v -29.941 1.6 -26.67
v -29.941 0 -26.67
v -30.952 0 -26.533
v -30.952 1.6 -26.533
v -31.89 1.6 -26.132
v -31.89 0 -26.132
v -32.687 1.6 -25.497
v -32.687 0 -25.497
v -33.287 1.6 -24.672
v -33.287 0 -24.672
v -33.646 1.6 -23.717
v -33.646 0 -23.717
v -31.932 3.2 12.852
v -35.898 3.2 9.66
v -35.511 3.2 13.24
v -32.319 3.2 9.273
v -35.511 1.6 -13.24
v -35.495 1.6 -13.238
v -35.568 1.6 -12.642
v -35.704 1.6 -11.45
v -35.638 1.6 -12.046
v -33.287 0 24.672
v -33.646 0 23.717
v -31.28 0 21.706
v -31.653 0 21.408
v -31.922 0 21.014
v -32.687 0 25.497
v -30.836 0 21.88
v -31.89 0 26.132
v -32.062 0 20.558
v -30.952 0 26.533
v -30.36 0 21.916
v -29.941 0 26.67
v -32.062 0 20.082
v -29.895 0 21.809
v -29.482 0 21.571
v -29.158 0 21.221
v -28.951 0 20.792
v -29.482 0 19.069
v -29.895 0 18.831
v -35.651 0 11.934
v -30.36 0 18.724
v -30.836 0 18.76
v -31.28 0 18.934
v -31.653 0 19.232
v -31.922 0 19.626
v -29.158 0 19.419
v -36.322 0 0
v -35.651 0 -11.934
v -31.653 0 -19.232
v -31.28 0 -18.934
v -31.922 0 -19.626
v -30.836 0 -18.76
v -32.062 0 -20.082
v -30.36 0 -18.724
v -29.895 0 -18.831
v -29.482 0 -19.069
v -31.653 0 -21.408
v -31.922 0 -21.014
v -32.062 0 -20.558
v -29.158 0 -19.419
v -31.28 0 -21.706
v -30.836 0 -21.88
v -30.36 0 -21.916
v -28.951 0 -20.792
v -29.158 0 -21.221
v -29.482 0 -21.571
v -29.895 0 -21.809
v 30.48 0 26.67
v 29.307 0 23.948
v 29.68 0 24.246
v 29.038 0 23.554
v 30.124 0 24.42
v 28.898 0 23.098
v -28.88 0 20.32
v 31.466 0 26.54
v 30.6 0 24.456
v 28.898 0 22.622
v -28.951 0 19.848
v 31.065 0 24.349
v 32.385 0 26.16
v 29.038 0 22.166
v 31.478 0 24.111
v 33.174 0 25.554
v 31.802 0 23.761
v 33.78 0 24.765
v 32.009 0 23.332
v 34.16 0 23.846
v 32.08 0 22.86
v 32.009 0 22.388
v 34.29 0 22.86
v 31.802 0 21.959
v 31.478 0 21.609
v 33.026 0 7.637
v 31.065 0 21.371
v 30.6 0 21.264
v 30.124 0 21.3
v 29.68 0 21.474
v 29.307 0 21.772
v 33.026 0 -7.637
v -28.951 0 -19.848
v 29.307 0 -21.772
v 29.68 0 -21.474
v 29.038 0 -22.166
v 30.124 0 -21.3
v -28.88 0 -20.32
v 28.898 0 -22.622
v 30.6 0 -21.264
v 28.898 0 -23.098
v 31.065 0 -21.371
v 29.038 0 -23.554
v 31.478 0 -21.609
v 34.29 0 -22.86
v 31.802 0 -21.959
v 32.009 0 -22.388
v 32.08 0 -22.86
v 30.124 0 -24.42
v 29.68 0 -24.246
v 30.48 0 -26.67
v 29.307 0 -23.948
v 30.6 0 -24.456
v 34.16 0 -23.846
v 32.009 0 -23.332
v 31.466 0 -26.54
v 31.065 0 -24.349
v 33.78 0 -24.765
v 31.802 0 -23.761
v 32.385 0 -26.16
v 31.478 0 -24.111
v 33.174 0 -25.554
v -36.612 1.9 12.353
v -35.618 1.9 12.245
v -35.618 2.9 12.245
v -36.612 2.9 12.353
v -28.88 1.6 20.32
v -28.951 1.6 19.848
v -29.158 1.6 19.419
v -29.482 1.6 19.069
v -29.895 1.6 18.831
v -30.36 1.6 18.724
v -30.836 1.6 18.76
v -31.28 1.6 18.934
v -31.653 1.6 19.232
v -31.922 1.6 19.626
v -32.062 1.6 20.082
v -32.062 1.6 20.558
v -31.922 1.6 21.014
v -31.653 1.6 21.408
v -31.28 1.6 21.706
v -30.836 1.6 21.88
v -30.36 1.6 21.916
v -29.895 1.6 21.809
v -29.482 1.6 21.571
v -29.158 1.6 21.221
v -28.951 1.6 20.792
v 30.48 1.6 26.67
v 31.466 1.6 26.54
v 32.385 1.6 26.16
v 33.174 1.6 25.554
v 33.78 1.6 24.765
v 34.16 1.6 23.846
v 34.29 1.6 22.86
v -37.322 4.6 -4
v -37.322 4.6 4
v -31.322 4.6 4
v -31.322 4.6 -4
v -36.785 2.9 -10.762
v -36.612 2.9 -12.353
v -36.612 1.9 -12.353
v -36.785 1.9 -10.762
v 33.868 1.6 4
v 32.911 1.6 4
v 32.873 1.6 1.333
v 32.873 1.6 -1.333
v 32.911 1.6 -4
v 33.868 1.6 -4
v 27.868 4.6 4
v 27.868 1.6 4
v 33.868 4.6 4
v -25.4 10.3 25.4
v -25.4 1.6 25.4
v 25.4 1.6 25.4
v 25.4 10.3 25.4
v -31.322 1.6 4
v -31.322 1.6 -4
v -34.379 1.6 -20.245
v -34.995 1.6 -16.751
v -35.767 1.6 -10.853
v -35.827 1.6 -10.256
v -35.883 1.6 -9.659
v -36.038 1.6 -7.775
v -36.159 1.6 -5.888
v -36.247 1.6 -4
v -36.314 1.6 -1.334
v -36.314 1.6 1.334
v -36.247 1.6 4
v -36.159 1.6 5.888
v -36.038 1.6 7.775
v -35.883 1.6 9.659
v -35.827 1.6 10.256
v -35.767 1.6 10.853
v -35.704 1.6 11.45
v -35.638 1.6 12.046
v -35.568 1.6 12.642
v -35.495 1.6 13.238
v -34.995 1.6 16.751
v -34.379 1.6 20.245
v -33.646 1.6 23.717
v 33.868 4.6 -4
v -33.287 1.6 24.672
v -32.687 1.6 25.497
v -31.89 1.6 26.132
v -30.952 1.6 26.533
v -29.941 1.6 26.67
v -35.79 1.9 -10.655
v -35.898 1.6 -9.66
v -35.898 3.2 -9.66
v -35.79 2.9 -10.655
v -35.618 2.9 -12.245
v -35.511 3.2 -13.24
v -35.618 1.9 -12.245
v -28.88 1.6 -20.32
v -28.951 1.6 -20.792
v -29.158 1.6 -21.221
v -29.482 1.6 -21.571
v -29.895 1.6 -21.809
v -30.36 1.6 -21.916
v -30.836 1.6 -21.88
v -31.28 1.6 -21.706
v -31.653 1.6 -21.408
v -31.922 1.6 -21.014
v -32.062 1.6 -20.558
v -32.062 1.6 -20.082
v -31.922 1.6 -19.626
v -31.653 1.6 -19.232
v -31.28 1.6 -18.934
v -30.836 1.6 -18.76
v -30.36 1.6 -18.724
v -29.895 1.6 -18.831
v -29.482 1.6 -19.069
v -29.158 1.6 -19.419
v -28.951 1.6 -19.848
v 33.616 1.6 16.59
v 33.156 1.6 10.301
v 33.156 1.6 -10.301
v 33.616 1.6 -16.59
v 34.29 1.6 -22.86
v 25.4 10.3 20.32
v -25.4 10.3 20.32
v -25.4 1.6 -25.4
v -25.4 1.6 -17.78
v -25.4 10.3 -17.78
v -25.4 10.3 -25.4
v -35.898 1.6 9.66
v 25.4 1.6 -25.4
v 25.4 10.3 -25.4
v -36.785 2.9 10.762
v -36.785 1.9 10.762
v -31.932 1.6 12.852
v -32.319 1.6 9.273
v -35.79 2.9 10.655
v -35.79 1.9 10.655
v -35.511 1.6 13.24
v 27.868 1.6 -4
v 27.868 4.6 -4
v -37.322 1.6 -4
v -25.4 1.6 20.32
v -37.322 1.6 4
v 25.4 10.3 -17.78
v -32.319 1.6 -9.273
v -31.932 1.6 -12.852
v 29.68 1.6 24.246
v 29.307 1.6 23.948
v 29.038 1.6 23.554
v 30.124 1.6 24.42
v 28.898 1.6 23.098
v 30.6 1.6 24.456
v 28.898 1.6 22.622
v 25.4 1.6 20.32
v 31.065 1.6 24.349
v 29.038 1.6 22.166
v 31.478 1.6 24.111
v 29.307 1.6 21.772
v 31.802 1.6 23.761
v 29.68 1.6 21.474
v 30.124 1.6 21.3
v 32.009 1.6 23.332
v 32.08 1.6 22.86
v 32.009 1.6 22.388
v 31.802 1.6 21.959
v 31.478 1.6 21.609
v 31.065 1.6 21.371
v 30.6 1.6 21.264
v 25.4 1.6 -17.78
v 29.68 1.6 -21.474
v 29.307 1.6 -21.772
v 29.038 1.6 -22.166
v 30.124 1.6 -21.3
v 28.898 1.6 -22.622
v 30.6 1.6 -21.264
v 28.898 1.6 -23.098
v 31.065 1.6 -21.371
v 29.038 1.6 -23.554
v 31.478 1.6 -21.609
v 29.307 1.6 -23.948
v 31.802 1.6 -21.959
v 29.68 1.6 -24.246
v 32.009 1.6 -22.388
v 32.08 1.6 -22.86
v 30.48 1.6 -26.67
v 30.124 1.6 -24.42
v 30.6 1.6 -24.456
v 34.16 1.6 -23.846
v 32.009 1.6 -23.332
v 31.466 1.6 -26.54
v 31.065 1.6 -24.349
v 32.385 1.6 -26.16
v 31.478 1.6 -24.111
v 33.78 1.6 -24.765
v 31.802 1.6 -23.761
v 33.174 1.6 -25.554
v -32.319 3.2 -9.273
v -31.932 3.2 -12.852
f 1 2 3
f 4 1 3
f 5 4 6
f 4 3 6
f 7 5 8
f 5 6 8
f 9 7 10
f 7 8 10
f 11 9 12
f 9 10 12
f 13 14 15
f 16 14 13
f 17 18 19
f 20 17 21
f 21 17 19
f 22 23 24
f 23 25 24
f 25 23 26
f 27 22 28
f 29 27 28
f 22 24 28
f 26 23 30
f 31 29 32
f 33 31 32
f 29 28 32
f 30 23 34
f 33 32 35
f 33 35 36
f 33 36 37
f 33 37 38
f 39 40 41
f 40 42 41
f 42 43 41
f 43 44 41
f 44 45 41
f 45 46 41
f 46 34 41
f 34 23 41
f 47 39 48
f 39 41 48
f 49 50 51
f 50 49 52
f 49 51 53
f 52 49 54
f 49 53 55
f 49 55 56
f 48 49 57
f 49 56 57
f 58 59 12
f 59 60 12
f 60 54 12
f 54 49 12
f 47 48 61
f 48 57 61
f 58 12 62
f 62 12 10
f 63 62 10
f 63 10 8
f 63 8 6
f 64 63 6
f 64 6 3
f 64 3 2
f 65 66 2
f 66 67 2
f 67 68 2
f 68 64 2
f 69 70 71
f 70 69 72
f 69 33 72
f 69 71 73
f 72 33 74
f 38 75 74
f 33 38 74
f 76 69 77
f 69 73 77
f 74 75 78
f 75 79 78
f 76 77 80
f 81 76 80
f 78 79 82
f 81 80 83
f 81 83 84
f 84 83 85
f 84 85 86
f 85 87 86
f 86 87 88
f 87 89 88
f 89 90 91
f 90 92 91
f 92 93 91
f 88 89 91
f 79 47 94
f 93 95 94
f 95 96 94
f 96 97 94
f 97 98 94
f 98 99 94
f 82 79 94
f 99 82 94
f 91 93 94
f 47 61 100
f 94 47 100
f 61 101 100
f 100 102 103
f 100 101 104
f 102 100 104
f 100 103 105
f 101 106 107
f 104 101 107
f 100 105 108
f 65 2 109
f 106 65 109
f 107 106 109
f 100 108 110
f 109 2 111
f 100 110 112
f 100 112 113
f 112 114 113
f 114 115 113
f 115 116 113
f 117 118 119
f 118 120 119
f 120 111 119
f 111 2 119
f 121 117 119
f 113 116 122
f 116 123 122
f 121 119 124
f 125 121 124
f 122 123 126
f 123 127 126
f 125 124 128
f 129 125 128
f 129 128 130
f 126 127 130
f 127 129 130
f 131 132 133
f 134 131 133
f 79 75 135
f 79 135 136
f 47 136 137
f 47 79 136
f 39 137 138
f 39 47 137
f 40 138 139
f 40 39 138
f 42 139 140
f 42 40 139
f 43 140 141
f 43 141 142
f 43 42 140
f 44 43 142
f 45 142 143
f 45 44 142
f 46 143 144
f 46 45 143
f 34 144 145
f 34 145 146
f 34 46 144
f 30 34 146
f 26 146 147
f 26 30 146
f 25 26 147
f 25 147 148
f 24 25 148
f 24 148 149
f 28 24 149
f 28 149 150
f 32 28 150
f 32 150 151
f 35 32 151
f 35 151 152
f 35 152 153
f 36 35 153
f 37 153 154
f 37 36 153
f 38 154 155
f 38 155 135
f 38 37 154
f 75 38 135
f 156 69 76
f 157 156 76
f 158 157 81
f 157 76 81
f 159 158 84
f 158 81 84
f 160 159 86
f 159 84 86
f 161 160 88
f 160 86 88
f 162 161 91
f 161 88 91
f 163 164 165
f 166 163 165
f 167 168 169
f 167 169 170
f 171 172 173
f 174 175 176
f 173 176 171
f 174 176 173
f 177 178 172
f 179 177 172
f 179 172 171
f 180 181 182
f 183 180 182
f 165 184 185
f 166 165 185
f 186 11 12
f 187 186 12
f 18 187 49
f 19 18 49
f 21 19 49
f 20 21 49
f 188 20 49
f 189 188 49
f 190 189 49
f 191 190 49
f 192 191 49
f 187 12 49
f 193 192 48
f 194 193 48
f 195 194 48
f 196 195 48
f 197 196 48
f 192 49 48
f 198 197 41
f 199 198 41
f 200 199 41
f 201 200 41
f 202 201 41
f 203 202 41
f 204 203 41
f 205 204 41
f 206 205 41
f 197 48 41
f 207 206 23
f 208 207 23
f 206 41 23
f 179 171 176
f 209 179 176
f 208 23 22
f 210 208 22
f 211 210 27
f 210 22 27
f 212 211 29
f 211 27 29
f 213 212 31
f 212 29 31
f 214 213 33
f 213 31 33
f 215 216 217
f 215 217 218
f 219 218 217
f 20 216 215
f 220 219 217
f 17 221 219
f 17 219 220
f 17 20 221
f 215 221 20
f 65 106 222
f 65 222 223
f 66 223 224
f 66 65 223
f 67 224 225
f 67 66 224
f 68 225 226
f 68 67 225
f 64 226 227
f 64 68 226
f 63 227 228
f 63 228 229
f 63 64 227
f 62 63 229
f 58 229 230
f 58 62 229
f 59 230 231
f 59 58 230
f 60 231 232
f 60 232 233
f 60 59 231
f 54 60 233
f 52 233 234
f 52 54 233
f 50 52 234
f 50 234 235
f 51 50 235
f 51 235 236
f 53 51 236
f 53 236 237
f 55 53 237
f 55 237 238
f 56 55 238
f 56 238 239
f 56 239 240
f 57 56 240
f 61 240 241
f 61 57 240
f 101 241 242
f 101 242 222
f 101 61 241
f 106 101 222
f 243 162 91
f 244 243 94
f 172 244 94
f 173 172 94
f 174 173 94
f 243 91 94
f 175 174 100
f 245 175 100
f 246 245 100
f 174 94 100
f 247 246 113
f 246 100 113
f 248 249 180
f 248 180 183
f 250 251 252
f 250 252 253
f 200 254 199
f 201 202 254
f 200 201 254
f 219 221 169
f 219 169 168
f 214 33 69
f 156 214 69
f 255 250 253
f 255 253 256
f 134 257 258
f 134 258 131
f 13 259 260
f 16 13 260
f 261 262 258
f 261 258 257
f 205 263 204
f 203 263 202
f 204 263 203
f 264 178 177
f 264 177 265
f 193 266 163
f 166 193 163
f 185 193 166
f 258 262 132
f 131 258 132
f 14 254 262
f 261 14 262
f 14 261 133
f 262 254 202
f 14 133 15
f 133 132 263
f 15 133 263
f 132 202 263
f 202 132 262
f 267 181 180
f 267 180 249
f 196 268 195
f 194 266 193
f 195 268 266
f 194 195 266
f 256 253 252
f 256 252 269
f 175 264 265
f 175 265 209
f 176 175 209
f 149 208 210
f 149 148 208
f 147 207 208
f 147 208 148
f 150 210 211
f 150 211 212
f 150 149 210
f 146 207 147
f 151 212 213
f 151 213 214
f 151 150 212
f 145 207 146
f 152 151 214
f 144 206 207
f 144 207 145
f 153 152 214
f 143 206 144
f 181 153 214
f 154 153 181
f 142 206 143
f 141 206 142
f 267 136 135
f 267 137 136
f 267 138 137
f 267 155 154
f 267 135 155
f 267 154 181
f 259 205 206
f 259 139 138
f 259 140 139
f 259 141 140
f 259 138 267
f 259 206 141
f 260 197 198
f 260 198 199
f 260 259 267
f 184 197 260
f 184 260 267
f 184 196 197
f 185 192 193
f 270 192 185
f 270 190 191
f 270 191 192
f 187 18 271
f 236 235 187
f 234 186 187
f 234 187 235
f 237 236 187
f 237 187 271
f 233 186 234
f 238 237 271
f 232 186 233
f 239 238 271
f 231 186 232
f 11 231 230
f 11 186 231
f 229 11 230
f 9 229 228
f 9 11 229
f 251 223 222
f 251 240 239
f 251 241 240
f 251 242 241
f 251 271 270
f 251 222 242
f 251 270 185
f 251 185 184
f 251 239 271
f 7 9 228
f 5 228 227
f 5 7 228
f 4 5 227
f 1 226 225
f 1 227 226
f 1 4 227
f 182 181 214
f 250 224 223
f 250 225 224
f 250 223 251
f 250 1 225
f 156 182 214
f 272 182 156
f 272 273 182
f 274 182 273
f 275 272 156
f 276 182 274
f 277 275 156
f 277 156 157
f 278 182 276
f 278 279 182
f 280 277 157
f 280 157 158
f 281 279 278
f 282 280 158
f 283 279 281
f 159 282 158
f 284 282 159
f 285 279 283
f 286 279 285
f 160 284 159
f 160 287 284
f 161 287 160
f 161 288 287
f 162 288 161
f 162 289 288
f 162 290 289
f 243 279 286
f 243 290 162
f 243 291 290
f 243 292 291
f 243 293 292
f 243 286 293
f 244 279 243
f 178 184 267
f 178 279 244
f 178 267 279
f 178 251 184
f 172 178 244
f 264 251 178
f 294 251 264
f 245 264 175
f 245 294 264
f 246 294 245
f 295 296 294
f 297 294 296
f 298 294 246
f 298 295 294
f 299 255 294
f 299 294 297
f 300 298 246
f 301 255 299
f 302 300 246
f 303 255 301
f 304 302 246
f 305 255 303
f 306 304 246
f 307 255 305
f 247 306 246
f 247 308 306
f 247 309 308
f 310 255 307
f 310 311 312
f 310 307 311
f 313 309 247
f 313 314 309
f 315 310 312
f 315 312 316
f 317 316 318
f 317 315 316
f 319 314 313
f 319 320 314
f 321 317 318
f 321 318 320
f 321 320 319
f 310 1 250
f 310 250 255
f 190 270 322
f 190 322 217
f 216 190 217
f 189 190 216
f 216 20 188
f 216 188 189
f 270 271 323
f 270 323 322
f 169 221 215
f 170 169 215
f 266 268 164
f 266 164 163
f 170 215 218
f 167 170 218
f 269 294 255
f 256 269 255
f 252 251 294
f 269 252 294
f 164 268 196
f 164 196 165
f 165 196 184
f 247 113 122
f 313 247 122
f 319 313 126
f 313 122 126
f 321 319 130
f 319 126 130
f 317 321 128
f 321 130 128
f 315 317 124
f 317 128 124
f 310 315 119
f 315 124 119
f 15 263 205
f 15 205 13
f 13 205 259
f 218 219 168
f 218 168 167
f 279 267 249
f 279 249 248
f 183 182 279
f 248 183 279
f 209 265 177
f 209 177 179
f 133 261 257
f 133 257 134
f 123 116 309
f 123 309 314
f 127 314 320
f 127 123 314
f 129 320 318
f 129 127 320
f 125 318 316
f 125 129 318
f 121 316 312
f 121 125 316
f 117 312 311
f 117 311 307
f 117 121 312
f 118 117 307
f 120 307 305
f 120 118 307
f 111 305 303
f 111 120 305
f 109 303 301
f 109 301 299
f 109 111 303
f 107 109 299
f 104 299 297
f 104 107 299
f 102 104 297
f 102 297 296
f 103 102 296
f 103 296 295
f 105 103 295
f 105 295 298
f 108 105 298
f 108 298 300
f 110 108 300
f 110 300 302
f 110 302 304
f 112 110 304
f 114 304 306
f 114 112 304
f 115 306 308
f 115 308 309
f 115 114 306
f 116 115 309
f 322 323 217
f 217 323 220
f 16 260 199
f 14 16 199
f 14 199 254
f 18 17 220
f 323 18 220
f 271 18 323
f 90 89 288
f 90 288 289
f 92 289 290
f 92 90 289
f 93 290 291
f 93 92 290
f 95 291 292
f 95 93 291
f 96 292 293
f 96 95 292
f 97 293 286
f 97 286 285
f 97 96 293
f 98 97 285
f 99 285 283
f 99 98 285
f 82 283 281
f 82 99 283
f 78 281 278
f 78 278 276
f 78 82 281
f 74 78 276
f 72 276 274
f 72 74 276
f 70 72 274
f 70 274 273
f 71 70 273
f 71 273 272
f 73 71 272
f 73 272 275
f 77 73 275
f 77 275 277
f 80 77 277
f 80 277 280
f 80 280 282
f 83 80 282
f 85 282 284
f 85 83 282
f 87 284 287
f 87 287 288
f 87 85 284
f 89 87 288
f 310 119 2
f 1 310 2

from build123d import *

# Parameters (mm, degrees)
SKETCH1_R           = 1.6
BOSS_EXTRUDE1_DEPTH = 1.6
SKETCH2_W           = 6
SKETCH2_H           = 8
BOSS_EXTRUDE2_DEPTH = 3
BOSS_EXTRUDE3_DEPTH = 1.6
SKETCH4_W           = 1.6
SKETCH4_H           = 1
BOSS_EXTRUDE4_DEPTH = 1
SKETCH5_W           = 1.6
SKETCH5_H           = 1
BOSS_EXTRUDE5_DEPTH = 1
SKETCH6_W           = 50.8
SKETCH6_H           = 5.08
SKETCH6_H_2         = 7.62
BOSS_EXTRUDE6_DEPTH = 8.7


with BuildPart() as part:
    # Sketch1 → Boss-Extrude1 (new body)
    with BuildSketch(Plane(origin=(0, 0, 0), x_dir=(1, 0, 0), z_dir=(0, 1, 0))):
        with BuildLine():
            Line((30.48, 26.67), (-29.941284627, 26.67))
            ThreePointArc((-29.941284627, 26.67), (-32.31004746, 25.841357037), (-33.645726791, 23.716822443))
            ThreePointArc((-33.645726791, 23.716822443), (-36.322, 0), (-33.645726791, -23.716822443))
            ThreePointArc((-33.645726791, -23.716822443), (-32.31004746, -25.841357037), (-29.941284627, -26.67))
            Line((-29.941284627, -26.67), (30.48, -26.67))
            ThreePointArc((30.48, -26.67), (33.174076836, -25.554076836), (34.29, -22.86))
            ThreePointArc((34.29, -22.86), (32.868, 0), (34.29, 22.86))
            ThreePointArc((34.29, 22.86), (33.174076836, 25.554076836), (30.48, 26.67))
        make_face()
        with Locations((30.48, 22.86)):
            Circle(SKETCH1_R, mode=Mode.SUBTRACT)
        with Locations((-30.48, 20.32)):
            Circle(SKETCH1_R, mode=Mode.SUBTRACT)
        with Locations((30.48, -22.86)):
            Circle(SKETCH1_R, mode=Mode.SUBTRACT)
        with Locations((-30.48, -20.32)):
            Circle(SKETCH1_R, mode=Mode.SUBTRACT)
    extrude(amount=BOSS_EXTRUDE1_DEPTH)

    # Sketch2 → Boss-Extrude2 (add)
    with BuildSketch(Plane(origin=(0, 1.6, 0), x_dir=(1, 0, 0), z_dir=(0, 1, 0))):
        with Locations((-34.322, 0)):
            Rectangle(SKETCH2_W, SKETCH2_H)
        with Locations((30.868, 0)):
            Rectangle(SKETCH2_W, SKETCH2_H)
    extrude(amount=BOSS_EXTRUDE2_DEPTH)

    # Sketch3 → Boss-Extrude3 (add)
    with BuildSketch(Plane(origin=(0, 1.6, 0), x_dir=(1, 0, 0), z_dir=(0, 1, 0))):
        Polygon((-35.510618925, 13.239552311), (-31.931514302, 12.85224094), (-32.318825673, 9.273136317), (-35.897930296, 9.660447689), align=None)
        Polygon((-31.931514302, -12.85224094), (-32.318825673, -9.273136317), (-35.897930296, -9.660447689), (-35.510618925, -13.239552311), align=None)
    extrude(amount=BOSS_EXTRUDE3_DEPTH)

    # Sketch4 → Boss-Extrude4 (add)
    with BuildSketch(Plane(origin=(-36.515718124, 0, 3.951533791), x_dir=(0.107586492, 0, 0.994195729), z_dir=(-0.994195729, 0, 0.107586492))):
        with Locations((7.542243437, 2.4)):
            Rectangle(SKETCH4_W, SKETCH4_H)
    extrude(amount=BOSS_EXTRUDE4_DEPTH)

    # Sketch5 → Boss-Extrude5 (add)
    with BuildSketch(Plane(origin=(-36.515718124, 0, -3.951533791), x_dir=(-0.107586492, 0, 0.994195729), z_dir=(-0.994195729, 0, -0.107586492))):
        with Locations((-7.542243437, 2.4)):
            Rectangle(SKETCH5_W, SKETCH5_H)
    extrude(amount=BOSS_EXTRUDE5_DEPTH)

    # Sketch6 → Boss-Extrude6 (add)
    with BuildSketch(Plane(origin=(0, 1.6, 0), x_dir=(1, 0, 0), z_dir=(0, 1, 0))):
        with Locations((0, -22.86)):
            Rectangle(SKETCH6_W, SKETCH6_H)
        with Locations((0, 21.59)):
            Rectangle(SKETCH6_W, SKETCH6_H_2)
    extrude(amount=BOSS_EXTRUDE6_DEPTH)


solid = part.part
